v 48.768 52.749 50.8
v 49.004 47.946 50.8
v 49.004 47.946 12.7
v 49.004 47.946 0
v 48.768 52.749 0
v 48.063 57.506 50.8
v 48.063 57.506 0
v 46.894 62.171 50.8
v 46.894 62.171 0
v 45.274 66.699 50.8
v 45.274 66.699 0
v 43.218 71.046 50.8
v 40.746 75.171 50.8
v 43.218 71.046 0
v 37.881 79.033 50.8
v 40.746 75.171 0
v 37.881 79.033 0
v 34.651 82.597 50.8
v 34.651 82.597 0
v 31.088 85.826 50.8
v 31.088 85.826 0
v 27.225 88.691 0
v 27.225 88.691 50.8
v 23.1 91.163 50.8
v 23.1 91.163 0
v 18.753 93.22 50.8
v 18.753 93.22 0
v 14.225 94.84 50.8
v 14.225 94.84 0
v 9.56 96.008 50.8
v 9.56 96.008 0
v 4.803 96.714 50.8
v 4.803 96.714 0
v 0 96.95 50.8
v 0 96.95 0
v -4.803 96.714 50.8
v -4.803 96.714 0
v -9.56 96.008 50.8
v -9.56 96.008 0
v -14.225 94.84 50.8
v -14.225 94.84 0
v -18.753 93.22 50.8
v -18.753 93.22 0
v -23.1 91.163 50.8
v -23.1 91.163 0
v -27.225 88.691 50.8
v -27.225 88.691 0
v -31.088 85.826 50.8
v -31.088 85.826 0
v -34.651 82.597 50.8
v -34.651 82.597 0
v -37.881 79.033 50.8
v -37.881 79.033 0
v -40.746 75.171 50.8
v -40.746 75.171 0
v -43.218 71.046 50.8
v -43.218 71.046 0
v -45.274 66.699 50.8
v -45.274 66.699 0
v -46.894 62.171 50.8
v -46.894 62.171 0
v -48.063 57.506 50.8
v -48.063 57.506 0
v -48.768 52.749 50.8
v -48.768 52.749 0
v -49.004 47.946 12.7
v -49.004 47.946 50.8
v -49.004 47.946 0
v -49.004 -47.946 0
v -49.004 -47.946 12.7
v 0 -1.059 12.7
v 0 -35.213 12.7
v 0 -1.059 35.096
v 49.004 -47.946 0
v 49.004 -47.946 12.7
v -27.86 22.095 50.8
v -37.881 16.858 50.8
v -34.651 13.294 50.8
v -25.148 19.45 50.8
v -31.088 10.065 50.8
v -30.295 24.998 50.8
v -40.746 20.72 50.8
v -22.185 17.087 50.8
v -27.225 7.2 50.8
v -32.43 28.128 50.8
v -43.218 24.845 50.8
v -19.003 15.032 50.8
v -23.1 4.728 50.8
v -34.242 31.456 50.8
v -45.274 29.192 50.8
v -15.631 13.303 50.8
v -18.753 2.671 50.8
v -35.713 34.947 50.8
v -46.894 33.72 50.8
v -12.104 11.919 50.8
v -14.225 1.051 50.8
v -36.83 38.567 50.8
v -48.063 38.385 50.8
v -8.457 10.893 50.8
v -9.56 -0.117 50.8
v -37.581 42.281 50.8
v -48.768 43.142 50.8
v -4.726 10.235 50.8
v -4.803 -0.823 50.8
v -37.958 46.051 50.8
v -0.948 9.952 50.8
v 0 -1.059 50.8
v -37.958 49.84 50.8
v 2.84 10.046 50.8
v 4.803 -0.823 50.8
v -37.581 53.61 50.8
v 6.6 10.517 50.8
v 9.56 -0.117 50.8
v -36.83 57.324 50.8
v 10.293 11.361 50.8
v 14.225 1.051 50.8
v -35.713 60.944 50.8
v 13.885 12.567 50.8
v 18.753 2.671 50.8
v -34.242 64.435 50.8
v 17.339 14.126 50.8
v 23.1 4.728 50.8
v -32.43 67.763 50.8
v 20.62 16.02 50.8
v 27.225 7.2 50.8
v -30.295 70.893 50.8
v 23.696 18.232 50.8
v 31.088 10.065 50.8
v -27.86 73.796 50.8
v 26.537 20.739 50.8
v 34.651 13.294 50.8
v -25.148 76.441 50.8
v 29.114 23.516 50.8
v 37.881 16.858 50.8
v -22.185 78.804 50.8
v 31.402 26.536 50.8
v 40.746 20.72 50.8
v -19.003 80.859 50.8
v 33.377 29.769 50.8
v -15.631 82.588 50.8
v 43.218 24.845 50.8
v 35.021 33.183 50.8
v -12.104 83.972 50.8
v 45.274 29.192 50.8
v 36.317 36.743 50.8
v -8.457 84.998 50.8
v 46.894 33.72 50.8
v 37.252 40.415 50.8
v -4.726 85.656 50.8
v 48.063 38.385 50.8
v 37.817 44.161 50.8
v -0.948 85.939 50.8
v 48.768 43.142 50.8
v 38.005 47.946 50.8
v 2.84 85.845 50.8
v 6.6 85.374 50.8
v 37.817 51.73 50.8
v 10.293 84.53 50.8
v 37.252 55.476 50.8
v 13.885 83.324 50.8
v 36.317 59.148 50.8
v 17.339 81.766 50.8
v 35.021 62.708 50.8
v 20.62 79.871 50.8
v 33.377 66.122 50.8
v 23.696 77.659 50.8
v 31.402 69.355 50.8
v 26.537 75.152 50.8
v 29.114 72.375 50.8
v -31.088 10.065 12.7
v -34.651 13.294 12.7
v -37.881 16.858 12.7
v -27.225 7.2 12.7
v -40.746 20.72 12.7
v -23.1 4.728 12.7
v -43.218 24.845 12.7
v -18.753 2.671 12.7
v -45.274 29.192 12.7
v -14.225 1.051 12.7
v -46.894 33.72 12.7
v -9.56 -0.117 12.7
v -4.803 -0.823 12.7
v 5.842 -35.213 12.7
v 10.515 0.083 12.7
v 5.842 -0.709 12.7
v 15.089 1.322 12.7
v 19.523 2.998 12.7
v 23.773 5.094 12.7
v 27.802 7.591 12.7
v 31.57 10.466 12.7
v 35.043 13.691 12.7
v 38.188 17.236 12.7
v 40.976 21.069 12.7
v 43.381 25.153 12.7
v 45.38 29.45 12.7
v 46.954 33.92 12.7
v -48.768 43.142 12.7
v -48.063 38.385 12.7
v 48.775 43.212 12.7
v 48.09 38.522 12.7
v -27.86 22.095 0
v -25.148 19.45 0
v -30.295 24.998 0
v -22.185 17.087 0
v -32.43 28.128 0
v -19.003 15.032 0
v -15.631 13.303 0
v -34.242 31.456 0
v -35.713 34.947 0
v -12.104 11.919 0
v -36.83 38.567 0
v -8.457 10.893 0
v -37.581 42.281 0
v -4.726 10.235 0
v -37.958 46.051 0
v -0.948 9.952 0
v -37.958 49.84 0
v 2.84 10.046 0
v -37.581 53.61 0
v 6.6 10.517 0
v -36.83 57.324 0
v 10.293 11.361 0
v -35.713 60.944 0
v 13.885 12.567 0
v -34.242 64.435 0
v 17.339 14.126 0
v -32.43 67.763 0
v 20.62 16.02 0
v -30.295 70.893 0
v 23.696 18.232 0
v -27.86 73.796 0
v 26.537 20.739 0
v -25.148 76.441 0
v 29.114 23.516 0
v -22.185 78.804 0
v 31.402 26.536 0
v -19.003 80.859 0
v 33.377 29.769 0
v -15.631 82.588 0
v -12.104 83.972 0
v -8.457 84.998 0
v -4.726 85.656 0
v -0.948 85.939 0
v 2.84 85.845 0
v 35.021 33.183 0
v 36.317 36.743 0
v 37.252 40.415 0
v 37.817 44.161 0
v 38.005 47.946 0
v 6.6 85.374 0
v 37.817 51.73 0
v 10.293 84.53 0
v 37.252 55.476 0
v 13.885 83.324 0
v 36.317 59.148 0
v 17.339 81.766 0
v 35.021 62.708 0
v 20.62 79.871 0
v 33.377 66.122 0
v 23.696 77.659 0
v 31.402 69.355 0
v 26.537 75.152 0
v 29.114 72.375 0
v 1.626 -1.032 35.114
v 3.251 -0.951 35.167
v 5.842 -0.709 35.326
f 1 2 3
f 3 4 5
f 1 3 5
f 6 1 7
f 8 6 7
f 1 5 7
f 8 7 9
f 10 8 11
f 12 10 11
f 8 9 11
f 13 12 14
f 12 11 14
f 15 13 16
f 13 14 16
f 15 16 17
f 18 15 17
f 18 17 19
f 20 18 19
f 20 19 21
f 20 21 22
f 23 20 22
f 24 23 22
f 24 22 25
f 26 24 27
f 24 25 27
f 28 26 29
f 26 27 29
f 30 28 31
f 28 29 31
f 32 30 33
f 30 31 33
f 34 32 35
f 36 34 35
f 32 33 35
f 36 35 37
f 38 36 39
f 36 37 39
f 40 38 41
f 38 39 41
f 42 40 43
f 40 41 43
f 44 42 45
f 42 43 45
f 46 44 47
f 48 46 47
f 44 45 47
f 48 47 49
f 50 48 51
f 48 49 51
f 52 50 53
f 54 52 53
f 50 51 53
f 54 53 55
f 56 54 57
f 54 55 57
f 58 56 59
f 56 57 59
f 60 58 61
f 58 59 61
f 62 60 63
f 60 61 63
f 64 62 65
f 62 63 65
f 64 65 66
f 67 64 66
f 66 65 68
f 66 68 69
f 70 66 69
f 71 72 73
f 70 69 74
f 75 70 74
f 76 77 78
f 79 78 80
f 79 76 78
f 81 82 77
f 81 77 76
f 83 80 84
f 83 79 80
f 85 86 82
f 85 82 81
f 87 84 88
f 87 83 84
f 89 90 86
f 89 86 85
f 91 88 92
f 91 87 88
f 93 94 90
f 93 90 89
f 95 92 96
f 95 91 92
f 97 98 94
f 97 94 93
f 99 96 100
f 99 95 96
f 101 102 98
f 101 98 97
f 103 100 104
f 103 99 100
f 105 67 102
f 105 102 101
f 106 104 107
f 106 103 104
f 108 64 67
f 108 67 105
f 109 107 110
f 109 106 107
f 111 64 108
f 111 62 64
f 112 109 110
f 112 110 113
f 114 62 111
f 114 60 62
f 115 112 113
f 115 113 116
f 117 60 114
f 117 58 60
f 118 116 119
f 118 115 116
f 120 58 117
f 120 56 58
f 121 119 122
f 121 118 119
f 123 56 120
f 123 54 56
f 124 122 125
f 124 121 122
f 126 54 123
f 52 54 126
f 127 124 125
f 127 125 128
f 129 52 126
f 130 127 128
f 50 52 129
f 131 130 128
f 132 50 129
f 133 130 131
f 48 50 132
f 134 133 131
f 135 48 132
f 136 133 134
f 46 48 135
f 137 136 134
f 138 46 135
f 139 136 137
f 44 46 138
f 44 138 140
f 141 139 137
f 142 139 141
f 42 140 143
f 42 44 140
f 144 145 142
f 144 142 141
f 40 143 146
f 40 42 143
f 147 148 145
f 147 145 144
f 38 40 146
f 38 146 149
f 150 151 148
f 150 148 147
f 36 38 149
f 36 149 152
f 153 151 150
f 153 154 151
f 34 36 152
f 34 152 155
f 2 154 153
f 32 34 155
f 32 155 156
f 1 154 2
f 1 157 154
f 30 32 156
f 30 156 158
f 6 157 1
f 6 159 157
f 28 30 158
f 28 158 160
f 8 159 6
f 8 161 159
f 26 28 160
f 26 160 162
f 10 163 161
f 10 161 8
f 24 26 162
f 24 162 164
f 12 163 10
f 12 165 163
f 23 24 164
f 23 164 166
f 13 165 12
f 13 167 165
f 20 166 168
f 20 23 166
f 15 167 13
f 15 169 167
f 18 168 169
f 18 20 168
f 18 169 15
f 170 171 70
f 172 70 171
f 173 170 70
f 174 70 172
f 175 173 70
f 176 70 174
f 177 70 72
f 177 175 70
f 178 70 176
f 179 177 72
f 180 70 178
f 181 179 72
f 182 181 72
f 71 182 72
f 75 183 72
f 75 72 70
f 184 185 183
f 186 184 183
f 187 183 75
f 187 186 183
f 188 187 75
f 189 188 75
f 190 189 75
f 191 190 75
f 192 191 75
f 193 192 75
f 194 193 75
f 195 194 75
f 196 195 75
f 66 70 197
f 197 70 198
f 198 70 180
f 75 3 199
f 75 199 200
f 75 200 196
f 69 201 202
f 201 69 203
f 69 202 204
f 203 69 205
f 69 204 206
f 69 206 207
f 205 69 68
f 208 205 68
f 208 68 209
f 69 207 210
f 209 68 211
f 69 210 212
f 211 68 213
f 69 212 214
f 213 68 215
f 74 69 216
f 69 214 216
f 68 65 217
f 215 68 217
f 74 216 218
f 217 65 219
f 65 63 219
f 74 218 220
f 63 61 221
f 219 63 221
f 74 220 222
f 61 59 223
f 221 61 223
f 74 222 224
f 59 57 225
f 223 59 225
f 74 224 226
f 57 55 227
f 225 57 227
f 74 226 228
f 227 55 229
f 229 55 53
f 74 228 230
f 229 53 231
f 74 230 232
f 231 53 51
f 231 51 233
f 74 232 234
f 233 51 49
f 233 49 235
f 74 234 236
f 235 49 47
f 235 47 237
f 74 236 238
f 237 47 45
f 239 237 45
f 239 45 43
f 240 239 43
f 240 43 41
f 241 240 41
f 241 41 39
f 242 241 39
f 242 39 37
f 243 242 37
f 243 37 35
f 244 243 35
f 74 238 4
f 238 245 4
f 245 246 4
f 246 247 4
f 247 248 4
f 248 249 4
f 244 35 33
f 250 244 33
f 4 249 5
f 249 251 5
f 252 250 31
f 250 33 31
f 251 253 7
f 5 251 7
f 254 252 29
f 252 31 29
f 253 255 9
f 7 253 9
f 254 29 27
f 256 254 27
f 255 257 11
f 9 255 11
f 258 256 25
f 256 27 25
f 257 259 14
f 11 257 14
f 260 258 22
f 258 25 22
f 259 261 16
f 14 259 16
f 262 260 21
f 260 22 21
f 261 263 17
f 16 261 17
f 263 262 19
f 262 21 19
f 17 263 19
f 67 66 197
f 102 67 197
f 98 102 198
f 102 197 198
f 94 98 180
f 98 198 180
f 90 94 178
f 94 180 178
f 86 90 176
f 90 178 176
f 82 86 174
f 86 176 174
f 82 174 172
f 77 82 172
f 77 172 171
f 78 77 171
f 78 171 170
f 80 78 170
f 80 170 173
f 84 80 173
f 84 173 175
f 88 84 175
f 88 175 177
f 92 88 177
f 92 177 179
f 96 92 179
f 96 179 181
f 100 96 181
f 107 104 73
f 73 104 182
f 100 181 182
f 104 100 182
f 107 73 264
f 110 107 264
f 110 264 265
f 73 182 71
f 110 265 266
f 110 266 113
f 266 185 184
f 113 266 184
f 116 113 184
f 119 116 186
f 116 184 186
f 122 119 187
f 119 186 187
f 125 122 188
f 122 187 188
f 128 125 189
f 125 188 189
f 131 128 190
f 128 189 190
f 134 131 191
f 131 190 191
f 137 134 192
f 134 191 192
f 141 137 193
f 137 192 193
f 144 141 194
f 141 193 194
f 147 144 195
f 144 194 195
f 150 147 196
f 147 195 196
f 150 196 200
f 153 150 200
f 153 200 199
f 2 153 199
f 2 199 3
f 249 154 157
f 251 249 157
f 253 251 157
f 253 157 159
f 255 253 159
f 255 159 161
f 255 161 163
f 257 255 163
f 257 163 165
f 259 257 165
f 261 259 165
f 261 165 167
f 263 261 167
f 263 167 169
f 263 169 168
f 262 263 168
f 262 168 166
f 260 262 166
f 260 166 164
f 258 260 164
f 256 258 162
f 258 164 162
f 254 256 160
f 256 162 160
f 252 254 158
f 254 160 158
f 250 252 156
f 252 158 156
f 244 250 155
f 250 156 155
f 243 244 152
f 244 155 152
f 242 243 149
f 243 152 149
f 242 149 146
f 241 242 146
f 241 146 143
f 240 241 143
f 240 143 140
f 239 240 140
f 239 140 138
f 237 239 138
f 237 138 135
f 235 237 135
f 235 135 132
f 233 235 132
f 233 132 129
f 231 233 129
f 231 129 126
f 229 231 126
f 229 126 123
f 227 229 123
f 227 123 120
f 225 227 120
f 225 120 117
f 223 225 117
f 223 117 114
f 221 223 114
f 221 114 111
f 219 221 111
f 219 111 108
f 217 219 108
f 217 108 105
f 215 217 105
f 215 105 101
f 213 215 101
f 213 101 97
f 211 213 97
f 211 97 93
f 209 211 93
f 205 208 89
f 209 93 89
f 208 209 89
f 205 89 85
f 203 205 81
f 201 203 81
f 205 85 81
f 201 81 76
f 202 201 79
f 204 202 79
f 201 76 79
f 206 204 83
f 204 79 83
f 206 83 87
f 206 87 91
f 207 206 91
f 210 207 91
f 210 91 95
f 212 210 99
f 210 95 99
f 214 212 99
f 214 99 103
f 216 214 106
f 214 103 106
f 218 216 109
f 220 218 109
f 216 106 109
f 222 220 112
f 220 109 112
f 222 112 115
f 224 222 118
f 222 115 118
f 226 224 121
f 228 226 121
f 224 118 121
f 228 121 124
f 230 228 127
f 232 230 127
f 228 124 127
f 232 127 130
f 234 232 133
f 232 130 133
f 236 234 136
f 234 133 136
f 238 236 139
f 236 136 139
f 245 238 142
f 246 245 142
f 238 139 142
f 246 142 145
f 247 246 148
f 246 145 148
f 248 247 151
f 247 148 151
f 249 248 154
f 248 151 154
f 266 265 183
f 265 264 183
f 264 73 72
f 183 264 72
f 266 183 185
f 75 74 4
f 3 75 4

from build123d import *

# Parameters (mm, degrees)
F1_DEPTH = 12.7
F3_DEPTH = 50.8
F4_R     = 38.0054760492
F5_DEPTH = 50.801
F9_DEPTH = 5.842


with BuildPart() as f1:
    # F0 (on Top) → F1 (new body)
    with BuildSketch(Plane.XY):
        with BuildLine():
            Line((-49.0042343736, -47.9455031455), (49.0042343736, -47.9455031455))
            Line((49.0042343736, -47.9455031455), (49.0042343736, 47.9455031455))
            ThreePointArc((49.0042343736, 47.9455031455), (0, -1.0587312281), (-49.0042343736, 47.9455031455))
            Line((-49.0042343736, 47.9455031455), (-49.0042343736, -47.9455031455))
        make_face()
    extrude(amount=F1_DEPTH)

    # F2 (on Top) → F3 (join)
    with BuildSketch(Plane.XY):
        with BuildLine():
            ThreePointArc((-49.0042343736, 47.9455031455), (0, -1.0587312281), (49.0042343736, 47.9455031455))
            ThreePointArc((49.0042343736, 47.9455031455), (0, 96.949737519), (-49.0042343736, 47.9455031455))
        make_face()
    extrude(amount=F3_DEPTH)

    # F4 (on face) → F5 (cut, through all)
    with BuildSketch(Plane.XY.offset(50.8)):
        with Locations((0, 47.9455031455)):
            Circle(F4_R)
    extrude(amount=-F5_DEPTH, mode=Mode.SUBTRACT)

    # F8 (on plane+point) → F9 (join)
    with BuildSketch(Plane.YZ):
        Polygon((0, 35.7907004654), (-35.212572664, 12.7), (0, 12.7), align=None)
    extrude(amount=F9_DEPTH)


solid = f1.part
